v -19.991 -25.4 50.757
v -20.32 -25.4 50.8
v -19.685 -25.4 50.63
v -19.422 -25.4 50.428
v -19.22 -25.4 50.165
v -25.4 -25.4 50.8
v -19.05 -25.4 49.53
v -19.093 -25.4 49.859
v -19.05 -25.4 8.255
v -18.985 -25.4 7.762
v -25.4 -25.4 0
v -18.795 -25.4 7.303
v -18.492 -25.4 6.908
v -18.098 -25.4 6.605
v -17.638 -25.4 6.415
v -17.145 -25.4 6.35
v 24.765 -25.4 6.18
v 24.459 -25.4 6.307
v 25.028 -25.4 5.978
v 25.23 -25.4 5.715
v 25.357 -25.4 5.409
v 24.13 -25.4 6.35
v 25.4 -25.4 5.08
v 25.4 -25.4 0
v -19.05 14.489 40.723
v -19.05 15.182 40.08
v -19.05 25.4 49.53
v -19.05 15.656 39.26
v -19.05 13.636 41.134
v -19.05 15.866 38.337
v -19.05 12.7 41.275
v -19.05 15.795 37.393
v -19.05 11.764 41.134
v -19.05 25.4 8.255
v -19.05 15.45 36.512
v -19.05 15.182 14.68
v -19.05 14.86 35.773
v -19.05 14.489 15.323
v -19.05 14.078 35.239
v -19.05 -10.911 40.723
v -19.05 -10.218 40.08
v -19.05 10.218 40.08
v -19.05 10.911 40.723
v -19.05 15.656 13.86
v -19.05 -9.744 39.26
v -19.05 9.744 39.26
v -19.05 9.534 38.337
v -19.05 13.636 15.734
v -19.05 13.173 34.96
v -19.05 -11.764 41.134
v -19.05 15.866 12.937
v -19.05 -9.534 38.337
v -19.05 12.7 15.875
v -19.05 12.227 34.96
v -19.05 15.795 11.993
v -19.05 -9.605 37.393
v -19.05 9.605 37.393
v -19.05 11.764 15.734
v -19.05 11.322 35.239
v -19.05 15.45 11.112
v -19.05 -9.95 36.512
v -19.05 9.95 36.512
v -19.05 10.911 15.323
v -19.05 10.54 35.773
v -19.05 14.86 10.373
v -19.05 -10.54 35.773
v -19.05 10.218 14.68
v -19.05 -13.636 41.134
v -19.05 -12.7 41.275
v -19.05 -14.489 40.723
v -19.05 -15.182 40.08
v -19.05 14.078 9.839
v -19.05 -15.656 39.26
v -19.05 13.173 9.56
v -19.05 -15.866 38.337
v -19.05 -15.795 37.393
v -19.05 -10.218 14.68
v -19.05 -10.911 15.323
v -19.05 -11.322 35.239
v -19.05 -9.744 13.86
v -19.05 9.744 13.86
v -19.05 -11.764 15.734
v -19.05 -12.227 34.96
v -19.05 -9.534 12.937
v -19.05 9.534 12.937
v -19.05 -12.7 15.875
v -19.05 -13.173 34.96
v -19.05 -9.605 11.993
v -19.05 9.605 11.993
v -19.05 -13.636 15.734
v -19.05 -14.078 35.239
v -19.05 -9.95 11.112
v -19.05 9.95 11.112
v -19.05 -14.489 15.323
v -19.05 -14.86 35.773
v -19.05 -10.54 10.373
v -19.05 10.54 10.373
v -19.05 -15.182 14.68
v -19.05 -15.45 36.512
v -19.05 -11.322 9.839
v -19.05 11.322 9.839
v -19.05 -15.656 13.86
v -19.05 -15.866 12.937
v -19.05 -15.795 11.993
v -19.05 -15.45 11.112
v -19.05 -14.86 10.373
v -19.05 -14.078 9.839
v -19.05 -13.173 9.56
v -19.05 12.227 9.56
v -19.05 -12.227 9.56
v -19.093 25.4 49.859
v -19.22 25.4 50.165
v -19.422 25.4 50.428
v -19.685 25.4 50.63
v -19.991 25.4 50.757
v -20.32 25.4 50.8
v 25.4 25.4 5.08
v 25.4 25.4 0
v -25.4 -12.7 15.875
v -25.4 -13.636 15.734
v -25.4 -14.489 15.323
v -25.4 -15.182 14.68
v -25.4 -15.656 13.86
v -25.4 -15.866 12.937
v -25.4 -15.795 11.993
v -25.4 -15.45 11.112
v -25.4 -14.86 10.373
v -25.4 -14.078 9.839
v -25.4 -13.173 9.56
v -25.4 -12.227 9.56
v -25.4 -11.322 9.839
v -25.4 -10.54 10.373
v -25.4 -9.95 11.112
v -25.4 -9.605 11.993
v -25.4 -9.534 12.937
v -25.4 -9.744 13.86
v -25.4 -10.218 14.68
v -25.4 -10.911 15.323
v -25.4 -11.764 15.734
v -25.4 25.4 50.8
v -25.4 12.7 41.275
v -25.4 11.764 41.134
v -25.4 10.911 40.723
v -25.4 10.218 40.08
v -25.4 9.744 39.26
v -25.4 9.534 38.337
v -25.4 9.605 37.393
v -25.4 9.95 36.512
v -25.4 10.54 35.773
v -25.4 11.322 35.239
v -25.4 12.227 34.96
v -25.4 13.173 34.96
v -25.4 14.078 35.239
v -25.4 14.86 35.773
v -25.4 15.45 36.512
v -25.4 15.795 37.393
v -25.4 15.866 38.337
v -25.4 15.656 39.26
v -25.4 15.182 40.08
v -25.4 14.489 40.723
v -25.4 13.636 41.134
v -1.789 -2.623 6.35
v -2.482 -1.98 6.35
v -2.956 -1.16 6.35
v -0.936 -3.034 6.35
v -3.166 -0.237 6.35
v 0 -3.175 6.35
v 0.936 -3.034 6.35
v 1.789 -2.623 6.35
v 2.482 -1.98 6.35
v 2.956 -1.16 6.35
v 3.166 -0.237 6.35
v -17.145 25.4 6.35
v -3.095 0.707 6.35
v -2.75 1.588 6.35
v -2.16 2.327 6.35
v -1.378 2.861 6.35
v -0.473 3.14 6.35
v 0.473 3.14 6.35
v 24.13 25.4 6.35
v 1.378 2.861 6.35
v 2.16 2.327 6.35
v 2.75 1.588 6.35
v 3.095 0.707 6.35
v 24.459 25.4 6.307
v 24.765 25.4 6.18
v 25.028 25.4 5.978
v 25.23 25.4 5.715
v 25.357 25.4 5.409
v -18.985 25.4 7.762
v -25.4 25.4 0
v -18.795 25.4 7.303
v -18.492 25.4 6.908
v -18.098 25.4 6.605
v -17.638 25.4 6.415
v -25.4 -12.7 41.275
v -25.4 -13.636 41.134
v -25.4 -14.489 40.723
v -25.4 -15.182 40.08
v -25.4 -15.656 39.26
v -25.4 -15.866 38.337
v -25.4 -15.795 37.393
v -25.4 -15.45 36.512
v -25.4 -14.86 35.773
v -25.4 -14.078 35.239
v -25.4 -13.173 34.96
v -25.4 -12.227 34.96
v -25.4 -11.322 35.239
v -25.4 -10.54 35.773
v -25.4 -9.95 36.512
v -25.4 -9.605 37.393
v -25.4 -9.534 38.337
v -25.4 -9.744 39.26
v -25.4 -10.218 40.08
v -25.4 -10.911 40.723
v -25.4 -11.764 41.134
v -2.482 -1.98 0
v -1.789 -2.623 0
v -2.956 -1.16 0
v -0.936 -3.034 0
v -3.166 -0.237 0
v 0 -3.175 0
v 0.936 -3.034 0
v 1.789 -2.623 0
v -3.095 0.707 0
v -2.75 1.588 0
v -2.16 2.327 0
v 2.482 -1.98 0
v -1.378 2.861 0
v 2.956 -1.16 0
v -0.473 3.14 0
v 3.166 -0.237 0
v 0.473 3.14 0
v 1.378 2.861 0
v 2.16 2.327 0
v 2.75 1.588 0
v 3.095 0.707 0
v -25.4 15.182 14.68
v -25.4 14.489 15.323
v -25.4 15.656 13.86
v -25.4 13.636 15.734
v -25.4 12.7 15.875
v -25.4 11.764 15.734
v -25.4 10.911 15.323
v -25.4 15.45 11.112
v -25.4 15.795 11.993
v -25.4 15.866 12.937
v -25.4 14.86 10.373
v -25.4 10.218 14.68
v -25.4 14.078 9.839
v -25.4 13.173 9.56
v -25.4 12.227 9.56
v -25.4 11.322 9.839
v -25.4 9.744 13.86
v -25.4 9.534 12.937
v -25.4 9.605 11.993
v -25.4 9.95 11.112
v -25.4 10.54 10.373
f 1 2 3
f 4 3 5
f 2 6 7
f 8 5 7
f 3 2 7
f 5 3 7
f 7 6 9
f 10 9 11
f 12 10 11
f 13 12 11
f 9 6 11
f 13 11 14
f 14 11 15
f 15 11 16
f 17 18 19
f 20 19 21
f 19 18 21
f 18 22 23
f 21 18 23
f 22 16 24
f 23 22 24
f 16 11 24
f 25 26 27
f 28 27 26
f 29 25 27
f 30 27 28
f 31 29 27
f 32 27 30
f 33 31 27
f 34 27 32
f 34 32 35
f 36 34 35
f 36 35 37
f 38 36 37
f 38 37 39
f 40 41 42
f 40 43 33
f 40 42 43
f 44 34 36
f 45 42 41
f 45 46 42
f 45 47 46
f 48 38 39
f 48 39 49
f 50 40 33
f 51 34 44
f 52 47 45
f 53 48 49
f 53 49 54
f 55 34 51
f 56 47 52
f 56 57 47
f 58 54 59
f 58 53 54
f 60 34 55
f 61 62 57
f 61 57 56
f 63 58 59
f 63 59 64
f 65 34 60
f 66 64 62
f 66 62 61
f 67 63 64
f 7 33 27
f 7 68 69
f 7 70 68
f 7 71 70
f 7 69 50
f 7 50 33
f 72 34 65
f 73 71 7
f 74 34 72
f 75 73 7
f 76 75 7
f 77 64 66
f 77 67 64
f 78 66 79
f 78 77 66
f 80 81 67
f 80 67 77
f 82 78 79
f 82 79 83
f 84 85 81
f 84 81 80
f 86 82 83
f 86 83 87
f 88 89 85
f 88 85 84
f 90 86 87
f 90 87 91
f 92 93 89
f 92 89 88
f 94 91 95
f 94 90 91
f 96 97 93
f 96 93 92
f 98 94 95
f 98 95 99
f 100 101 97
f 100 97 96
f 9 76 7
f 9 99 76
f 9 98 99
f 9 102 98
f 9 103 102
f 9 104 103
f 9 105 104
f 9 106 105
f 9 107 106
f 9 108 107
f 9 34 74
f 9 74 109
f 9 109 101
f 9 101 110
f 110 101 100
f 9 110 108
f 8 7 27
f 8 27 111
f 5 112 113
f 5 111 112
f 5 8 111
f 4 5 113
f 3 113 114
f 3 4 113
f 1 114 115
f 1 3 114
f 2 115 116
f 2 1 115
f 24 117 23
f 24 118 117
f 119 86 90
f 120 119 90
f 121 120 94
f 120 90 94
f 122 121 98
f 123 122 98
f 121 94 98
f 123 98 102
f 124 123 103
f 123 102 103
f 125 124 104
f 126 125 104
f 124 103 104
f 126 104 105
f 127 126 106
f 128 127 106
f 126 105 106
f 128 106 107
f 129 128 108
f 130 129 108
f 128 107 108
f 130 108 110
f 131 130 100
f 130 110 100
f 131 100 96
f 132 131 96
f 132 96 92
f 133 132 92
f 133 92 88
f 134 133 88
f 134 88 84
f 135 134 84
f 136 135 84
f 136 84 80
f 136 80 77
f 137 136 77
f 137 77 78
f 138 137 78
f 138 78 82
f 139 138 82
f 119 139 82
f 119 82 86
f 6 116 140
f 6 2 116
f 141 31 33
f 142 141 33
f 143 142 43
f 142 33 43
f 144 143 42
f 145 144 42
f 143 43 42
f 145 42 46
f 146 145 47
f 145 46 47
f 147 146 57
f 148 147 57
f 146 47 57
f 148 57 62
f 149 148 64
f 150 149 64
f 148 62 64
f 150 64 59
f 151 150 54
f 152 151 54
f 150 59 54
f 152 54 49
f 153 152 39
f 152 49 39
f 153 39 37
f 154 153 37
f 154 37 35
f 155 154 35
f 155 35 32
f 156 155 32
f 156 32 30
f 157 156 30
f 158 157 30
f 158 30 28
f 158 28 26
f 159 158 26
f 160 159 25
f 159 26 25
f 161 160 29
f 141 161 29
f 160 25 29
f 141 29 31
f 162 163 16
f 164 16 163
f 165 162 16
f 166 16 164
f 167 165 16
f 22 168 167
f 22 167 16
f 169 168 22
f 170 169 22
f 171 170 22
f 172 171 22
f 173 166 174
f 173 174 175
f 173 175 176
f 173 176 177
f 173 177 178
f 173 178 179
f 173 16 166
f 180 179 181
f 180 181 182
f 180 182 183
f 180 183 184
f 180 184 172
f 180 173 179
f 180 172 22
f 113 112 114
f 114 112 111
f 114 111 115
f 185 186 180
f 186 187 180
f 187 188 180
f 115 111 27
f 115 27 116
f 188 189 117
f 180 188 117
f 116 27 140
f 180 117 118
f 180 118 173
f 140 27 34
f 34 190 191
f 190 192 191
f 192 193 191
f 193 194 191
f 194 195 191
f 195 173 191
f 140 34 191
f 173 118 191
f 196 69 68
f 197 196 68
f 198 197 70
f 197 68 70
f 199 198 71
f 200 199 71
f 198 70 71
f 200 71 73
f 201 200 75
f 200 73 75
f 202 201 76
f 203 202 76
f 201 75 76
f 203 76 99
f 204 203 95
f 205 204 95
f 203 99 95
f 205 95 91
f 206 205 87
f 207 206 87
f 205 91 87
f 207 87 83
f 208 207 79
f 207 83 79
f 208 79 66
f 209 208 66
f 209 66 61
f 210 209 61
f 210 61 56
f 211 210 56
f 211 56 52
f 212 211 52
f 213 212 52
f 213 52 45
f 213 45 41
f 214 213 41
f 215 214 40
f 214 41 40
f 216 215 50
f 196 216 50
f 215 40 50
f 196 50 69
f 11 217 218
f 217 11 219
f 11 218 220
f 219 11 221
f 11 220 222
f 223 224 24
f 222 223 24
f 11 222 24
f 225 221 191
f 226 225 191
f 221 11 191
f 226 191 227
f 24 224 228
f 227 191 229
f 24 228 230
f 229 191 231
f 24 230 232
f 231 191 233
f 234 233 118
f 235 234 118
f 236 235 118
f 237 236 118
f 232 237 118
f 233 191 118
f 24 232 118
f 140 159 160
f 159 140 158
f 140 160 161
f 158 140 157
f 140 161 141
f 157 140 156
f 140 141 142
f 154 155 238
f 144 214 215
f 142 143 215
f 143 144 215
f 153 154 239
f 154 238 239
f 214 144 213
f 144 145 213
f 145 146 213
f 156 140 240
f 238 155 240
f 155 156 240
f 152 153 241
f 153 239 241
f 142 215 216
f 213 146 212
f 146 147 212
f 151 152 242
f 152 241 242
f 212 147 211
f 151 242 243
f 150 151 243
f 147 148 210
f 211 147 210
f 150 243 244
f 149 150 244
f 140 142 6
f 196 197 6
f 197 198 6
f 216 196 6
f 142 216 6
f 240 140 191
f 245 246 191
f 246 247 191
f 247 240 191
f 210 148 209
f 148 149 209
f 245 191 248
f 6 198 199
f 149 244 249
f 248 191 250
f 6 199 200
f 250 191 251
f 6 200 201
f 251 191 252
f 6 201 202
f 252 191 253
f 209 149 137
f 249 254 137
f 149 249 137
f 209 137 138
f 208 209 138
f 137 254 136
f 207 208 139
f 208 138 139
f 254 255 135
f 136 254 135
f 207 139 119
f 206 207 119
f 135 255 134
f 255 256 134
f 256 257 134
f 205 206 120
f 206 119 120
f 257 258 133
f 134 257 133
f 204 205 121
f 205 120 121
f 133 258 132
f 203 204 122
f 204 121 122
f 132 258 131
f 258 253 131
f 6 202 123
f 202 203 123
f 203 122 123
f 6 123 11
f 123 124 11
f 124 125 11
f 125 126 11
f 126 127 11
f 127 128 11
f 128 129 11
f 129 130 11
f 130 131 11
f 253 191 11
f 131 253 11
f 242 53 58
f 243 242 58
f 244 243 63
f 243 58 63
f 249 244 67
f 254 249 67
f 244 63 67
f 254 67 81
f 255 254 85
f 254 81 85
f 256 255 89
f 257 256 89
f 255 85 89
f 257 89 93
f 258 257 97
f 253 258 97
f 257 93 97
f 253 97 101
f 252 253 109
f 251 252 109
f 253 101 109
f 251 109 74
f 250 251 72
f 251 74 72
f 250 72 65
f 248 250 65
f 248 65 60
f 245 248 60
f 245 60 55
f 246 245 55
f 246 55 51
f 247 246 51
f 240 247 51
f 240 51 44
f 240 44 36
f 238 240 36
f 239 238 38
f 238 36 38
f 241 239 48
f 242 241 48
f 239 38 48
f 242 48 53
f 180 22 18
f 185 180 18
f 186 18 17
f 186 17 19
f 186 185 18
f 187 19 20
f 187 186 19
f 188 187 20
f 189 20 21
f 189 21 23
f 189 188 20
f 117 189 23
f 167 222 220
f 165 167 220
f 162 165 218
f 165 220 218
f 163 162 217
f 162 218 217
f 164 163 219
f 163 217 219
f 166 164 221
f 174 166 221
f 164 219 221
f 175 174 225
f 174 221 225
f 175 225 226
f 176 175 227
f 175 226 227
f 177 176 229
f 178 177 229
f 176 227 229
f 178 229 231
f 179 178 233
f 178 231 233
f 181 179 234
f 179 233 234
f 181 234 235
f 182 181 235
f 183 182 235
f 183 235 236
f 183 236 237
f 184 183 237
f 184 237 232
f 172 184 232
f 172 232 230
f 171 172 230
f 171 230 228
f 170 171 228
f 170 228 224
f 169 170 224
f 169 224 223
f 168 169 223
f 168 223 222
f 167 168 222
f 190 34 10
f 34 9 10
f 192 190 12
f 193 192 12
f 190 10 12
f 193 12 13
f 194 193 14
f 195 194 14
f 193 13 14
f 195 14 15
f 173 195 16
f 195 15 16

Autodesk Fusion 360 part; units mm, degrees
sketch "Sketch1" plane through (0, 0, 0) normal (0, 0, 1) x (1, 0, 0)
  line L0 (-25.4, 25.4) -> (25.4, 25.4)
  line L1 (25.4, 25.4) -> (25.4, -25.4)
  line L2 (25.4, -25.4) -> (-25.4, -25.4)
  line L3 (-25.4, -25.4) -> (-25.4, 25.4)
  line L4 (0, 25.4) -> (0, -25.4)
  line L5 (-25.4, 0) -> (25.4, 0)
  circle A0 centre (0, 0) radius 3.175
  dimension "d1" = 6.35
  dimension "d2" = 50.8
  dimension "d3" = 50.8
extrude "Extrude1" add sketch "Sketch1" along normal blind 6.35
sketch "Sketch2" plane through (0, 0, 6.35) normal (0, 0, 1) x (-1, 0, 0)
  line L0 (25.4, 25.4) -> (-25.4, 25.4)
  line L1 (-25.4, 25.4) -> (-25.4, -25.4)
  line L2 (-25.4, -25.4) -> (25.4, -25.4)
  line L3 (25.4, -25.4) -> (25.4, 25.4)
  circle A0 centre (0, 0) radius 3.175
  dimension "d6" = 6.35
hole "Hole1" at (0, 0, 6.35) direction (0, 0, -1) diameter 6.35 depth 6.35 tip angle 118
sketch "Sketch3" plane through (0, 0, 6.35) normal (0, 0, 1) x (-1, 0, 0)
  circle A0 centre (0, 0) radius 3.175
  line L0 (25.4, 25.4) -> (-25.4, 25.4)
  line L1 (-25.4, 25.4) -> (-25.4, -25.4)
  line L2 (-25.4, -25.4) -> (25.4, -25.4)
  line L3 (25.4, -25.4) -> (25.4, 25.4)
  line L4 (19.05, -25.4) -> (19.05, 25.4)
  dimension "d10" = 6.35
extrude "Extrude2" add sketch "Sketch3" along normal blind 44.45 contours L0 L2 L3 L4
sketch "Sketch4" plane through (-25.4, 0, 0) normal (-1, 0, 0) x (0, -1, 0)
  line L0 (-25.4, 0) -> (25.4, 0)
  line L1 (25.4, 0) -> (25.4, 50.8)
  line L2 (25.4, 50.8) -> (-25.4, 50.8)
  line L3 (-25.4, 50.8) -> (-25.4, 0)
  circle A0 centre (-12.7, 38.1) radius 2.3812
  circle A1 centre (12.7, 38.1) radius 2.3812
  circle A2 centre (-12.7, 12.7) radius 2.3812
  circle A3 centre (12.7, 12.7) radius 2.3812
  dimension "d13" = 4.7625
  dimension "d16" = 25.4
  dimension "d17" = -25.4
hole "Hole2" at (-25.4, 12.7, 38.1) at (-25.4, -12.7, 38.1) at (-25.4, -12.7, 12.7) at (-25.4, 12.7, 12.7) direction (1, 0, 0) diameter 6.35 depth 6.35 tip angle 118
sketch "Sketch5" plane through (-25.4, 0, 0) normal (-1, 0, 0) x (0, -1, 0)
  circle A0 centre (12.7, 12.7) radius 3.175
  circle A1 centre (-12.7, 38.1) radius 3.175
  circle A2 centre (12.7, 38.1) radius 3.175
  circle A3 centre (-12.7, 12.7) radius 3.175
  line L0 (-25.4, 0) -> (25.4, 0)
  line L1 (25.4, 0) -> (25.4, 50.8)
  line L2 (25.4, 50.8) -> (-25.4, 50.8)
  line L3 (-25.4, 50.8) -> (-25.4, 0)
fillet "Fillet1" radius 1.27 1 edges at (-19.05, 0, 50.8)
fillet "Fillet2" radius 1.905 1 edges at (-19.05, 0, 6.35)
fillet "Fillet3" radius 1.27 1 edges at (25.4, 0, 6.35)
equation "d13 = ( 3 / 16 ) * 1 in"
